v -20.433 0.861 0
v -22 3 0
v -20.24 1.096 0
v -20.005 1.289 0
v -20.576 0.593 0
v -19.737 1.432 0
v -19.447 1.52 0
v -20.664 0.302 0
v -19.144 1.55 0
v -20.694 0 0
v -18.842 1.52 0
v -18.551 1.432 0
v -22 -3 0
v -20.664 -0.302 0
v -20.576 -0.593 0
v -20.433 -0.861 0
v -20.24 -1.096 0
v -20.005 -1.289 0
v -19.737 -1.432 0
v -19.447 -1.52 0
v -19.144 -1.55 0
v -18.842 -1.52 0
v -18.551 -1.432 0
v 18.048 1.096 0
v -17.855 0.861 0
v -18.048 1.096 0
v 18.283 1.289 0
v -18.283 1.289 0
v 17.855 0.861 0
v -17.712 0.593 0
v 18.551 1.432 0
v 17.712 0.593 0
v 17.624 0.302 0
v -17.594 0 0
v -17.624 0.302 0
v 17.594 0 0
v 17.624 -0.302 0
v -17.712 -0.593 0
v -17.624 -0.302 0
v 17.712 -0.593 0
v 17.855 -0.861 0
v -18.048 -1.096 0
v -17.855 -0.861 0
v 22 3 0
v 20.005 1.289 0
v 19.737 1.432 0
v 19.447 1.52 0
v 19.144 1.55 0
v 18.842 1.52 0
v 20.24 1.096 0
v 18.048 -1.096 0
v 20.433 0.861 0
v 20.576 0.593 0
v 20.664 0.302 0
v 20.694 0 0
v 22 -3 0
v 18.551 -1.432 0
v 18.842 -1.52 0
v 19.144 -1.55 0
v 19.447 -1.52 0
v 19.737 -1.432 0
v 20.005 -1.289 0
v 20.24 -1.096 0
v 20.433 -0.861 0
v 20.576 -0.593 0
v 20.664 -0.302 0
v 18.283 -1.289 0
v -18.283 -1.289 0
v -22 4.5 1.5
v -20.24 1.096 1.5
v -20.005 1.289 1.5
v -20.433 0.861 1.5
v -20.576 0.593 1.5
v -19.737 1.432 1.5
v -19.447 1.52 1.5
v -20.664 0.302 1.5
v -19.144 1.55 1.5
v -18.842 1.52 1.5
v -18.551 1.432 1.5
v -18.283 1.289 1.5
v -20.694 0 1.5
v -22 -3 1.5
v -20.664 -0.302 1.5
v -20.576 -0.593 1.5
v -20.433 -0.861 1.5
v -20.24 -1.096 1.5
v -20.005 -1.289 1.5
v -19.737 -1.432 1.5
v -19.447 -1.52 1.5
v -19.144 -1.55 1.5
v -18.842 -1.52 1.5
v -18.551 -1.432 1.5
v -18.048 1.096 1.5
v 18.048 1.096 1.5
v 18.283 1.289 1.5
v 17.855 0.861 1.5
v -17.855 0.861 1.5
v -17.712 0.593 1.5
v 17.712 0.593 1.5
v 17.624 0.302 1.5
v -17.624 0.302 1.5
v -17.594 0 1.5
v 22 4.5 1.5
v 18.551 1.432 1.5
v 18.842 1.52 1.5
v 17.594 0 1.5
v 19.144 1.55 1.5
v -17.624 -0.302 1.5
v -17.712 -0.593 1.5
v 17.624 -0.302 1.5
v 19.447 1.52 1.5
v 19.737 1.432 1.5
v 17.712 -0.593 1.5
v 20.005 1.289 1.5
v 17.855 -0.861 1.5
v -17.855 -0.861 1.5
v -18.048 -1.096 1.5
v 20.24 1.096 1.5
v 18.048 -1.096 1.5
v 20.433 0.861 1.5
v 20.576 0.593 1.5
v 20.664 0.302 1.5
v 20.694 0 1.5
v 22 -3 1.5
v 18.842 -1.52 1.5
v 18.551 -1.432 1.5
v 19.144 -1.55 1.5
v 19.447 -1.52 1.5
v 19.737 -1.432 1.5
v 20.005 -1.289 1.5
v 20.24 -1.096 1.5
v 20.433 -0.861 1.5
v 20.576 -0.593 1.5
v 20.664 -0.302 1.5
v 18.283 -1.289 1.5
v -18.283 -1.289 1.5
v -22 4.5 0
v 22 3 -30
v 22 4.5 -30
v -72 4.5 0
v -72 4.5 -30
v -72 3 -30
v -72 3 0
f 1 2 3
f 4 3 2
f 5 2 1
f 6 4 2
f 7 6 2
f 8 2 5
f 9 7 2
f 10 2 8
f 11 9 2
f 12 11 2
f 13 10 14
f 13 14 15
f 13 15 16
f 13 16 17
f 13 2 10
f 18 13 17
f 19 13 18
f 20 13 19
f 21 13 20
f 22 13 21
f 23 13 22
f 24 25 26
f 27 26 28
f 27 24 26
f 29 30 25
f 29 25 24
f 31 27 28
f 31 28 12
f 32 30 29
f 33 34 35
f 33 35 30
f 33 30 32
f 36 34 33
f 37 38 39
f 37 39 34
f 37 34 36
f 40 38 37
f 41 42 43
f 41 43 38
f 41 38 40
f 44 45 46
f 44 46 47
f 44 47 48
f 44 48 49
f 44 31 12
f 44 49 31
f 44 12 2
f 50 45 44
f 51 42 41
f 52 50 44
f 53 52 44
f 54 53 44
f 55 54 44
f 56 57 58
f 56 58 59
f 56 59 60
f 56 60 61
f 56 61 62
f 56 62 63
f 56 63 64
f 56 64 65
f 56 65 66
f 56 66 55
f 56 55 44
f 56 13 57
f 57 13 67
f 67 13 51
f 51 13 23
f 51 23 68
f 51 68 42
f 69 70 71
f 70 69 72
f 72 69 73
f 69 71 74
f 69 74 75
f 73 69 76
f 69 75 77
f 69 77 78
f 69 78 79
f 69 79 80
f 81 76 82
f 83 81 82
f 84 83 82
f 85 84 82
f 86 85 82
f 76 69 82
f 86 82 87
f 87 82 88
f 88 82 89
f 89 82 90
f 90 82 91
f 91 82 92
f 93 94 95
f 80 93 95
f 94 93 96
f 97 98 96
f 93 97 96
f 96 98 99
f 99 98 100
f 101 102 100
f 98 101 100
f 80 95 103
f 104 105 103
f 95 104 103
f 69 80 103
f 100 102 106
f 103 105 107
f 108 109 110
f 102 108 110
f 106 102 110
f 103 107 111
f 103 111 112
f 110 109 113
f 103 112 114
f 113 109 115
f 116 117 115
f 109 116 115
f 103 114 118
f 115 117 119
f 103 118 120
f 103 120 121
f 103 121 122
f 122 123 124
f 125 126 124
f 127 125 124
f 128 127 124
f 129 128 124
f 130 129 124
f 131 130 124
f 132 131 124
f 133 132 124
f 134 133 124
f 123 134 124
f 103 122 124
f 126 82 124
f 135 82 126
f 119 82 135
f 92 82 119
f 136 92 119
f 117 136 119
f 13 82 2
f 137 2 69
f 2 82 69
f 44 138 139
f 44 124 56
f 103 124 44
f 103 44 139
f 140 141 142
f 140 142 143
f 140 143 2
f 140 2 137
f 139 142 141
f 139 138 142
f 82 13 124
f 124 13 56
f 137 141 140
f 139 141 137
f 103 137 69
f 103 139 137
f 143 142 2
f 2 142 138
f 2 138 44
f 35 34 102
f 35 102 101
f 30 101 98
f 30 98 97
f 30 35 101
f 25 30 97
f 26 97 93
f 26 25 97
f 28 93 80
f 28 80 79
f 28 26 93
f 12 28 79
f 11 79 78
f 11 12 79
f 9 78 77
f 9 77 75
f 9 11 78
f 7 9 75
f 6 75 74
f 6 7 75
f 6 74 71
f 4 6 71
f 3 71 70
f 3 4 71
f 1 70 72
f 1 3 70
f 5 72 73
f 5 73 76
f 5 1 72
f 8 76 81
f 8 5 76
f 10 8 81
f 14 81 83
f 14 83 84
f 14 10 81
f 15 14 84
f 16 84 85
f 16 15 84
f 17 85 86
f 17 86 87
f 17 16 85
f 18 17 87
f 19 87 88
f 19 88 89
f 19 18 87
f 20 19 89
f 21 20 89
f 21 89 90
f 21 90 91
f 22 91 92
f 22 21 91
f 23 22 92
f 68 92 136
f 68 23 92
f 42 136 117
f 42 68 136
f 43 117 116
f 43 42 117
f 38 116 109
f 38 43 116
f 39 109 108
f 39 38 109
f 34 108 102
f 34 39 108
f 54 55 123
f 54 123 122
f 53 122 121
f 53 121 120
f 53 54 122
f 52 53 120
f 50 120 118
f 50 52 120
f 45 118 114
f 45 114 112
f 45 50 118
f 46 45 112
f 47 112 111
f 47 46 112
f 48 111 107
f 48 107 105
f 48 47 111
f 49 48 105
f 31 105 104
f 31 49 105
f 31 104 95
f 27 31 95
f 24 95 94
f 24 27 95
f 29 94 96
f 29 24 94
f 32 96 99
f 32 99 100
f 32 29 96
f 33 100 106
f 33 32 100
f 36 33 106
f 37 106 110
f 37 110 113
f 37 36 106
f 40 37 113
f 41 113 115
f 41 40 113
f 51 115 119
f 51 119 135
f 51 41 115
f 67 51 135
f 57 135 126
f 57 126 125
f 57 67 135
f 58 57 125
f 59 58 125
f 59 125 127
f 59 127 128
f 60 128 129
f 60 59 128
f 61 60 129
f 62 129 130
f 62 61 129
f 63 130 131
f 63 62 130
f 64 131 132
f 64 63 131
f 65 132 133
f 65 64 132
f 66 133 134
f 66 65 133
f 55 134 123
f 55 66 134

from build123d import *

# Parameters (mm, degrees)
SKETCH_1_W      = 44
SKETCH_1_H      = 6
SKETCH_1_R      = 1.55
EXTRUDE_1_DEPTH = 1.5
SKETCH_2_W      = 44
SKETCH_2_H      = 1.5
EXTRUDE_2_DEPTH = 1.5
SKETCH_4_W      = 44
SKETCH_4_H      = 1.5
EXTRUDE_3_DEPTH = 30
SKETCH_6_W      = 30
SKETCH_6_H      = 1.5
EXTRUDE_4_DEPTH = 50


with BuildPart() as part:
    # 草图1 → 凸台-拉伸1 (new body)
    with BuildSketch(Plane.XY):
        Rectangle(SKETCH_1_W, SKETCH_1_H)
        with Locations((-19.14418972, 0)):
            Circle(SKETCH_1_R, mode=Mode.SUBTRACT)
        with Locations((19.14418972, 0)):
            Circle(SKETCH_1_R, mode=Mode.SUBTRACT)
    extrude(amount=EXTRUDE_1_DEPTH)

    # 草图2 → 凸台-拉伸2 (add)
    with BuildSketch(Plane(origin=(0, 3, 0), x_dir=(1, 0, 0), z_dir=(0, 1, 0))):
        with Locations((0, -0.75)):
            Rectangle(SKETCH_2_W, SKETCH_2_H)
    extrude(amount=EXTRUDE_2_DEPTH)

    # 草图4 → 凸台-拉伸3 (add)
    with BuildSketch(Plane(origin=(0, 0, 0), x_dir=(-1, 0, 0), z_dir=(0, 0, -1))):
        with Locations((0, 3.75)):
            Rectangle(SKETCH_4_W, SKETCH_4_H)
    extrude(amount=EXTRUDE_3_DEPTH)

    # 草图6 → 凸台-拉伸4 (add)
    with BuildSketch(Plane.ZY.offset(22)):
        with Locations((-15, 3.75)):
            Rectangle(SKETCH_6_W, SKETCH_6_H)
    extrude(amount=EXTRUDE_4_DEPTH)


solid = part.part
